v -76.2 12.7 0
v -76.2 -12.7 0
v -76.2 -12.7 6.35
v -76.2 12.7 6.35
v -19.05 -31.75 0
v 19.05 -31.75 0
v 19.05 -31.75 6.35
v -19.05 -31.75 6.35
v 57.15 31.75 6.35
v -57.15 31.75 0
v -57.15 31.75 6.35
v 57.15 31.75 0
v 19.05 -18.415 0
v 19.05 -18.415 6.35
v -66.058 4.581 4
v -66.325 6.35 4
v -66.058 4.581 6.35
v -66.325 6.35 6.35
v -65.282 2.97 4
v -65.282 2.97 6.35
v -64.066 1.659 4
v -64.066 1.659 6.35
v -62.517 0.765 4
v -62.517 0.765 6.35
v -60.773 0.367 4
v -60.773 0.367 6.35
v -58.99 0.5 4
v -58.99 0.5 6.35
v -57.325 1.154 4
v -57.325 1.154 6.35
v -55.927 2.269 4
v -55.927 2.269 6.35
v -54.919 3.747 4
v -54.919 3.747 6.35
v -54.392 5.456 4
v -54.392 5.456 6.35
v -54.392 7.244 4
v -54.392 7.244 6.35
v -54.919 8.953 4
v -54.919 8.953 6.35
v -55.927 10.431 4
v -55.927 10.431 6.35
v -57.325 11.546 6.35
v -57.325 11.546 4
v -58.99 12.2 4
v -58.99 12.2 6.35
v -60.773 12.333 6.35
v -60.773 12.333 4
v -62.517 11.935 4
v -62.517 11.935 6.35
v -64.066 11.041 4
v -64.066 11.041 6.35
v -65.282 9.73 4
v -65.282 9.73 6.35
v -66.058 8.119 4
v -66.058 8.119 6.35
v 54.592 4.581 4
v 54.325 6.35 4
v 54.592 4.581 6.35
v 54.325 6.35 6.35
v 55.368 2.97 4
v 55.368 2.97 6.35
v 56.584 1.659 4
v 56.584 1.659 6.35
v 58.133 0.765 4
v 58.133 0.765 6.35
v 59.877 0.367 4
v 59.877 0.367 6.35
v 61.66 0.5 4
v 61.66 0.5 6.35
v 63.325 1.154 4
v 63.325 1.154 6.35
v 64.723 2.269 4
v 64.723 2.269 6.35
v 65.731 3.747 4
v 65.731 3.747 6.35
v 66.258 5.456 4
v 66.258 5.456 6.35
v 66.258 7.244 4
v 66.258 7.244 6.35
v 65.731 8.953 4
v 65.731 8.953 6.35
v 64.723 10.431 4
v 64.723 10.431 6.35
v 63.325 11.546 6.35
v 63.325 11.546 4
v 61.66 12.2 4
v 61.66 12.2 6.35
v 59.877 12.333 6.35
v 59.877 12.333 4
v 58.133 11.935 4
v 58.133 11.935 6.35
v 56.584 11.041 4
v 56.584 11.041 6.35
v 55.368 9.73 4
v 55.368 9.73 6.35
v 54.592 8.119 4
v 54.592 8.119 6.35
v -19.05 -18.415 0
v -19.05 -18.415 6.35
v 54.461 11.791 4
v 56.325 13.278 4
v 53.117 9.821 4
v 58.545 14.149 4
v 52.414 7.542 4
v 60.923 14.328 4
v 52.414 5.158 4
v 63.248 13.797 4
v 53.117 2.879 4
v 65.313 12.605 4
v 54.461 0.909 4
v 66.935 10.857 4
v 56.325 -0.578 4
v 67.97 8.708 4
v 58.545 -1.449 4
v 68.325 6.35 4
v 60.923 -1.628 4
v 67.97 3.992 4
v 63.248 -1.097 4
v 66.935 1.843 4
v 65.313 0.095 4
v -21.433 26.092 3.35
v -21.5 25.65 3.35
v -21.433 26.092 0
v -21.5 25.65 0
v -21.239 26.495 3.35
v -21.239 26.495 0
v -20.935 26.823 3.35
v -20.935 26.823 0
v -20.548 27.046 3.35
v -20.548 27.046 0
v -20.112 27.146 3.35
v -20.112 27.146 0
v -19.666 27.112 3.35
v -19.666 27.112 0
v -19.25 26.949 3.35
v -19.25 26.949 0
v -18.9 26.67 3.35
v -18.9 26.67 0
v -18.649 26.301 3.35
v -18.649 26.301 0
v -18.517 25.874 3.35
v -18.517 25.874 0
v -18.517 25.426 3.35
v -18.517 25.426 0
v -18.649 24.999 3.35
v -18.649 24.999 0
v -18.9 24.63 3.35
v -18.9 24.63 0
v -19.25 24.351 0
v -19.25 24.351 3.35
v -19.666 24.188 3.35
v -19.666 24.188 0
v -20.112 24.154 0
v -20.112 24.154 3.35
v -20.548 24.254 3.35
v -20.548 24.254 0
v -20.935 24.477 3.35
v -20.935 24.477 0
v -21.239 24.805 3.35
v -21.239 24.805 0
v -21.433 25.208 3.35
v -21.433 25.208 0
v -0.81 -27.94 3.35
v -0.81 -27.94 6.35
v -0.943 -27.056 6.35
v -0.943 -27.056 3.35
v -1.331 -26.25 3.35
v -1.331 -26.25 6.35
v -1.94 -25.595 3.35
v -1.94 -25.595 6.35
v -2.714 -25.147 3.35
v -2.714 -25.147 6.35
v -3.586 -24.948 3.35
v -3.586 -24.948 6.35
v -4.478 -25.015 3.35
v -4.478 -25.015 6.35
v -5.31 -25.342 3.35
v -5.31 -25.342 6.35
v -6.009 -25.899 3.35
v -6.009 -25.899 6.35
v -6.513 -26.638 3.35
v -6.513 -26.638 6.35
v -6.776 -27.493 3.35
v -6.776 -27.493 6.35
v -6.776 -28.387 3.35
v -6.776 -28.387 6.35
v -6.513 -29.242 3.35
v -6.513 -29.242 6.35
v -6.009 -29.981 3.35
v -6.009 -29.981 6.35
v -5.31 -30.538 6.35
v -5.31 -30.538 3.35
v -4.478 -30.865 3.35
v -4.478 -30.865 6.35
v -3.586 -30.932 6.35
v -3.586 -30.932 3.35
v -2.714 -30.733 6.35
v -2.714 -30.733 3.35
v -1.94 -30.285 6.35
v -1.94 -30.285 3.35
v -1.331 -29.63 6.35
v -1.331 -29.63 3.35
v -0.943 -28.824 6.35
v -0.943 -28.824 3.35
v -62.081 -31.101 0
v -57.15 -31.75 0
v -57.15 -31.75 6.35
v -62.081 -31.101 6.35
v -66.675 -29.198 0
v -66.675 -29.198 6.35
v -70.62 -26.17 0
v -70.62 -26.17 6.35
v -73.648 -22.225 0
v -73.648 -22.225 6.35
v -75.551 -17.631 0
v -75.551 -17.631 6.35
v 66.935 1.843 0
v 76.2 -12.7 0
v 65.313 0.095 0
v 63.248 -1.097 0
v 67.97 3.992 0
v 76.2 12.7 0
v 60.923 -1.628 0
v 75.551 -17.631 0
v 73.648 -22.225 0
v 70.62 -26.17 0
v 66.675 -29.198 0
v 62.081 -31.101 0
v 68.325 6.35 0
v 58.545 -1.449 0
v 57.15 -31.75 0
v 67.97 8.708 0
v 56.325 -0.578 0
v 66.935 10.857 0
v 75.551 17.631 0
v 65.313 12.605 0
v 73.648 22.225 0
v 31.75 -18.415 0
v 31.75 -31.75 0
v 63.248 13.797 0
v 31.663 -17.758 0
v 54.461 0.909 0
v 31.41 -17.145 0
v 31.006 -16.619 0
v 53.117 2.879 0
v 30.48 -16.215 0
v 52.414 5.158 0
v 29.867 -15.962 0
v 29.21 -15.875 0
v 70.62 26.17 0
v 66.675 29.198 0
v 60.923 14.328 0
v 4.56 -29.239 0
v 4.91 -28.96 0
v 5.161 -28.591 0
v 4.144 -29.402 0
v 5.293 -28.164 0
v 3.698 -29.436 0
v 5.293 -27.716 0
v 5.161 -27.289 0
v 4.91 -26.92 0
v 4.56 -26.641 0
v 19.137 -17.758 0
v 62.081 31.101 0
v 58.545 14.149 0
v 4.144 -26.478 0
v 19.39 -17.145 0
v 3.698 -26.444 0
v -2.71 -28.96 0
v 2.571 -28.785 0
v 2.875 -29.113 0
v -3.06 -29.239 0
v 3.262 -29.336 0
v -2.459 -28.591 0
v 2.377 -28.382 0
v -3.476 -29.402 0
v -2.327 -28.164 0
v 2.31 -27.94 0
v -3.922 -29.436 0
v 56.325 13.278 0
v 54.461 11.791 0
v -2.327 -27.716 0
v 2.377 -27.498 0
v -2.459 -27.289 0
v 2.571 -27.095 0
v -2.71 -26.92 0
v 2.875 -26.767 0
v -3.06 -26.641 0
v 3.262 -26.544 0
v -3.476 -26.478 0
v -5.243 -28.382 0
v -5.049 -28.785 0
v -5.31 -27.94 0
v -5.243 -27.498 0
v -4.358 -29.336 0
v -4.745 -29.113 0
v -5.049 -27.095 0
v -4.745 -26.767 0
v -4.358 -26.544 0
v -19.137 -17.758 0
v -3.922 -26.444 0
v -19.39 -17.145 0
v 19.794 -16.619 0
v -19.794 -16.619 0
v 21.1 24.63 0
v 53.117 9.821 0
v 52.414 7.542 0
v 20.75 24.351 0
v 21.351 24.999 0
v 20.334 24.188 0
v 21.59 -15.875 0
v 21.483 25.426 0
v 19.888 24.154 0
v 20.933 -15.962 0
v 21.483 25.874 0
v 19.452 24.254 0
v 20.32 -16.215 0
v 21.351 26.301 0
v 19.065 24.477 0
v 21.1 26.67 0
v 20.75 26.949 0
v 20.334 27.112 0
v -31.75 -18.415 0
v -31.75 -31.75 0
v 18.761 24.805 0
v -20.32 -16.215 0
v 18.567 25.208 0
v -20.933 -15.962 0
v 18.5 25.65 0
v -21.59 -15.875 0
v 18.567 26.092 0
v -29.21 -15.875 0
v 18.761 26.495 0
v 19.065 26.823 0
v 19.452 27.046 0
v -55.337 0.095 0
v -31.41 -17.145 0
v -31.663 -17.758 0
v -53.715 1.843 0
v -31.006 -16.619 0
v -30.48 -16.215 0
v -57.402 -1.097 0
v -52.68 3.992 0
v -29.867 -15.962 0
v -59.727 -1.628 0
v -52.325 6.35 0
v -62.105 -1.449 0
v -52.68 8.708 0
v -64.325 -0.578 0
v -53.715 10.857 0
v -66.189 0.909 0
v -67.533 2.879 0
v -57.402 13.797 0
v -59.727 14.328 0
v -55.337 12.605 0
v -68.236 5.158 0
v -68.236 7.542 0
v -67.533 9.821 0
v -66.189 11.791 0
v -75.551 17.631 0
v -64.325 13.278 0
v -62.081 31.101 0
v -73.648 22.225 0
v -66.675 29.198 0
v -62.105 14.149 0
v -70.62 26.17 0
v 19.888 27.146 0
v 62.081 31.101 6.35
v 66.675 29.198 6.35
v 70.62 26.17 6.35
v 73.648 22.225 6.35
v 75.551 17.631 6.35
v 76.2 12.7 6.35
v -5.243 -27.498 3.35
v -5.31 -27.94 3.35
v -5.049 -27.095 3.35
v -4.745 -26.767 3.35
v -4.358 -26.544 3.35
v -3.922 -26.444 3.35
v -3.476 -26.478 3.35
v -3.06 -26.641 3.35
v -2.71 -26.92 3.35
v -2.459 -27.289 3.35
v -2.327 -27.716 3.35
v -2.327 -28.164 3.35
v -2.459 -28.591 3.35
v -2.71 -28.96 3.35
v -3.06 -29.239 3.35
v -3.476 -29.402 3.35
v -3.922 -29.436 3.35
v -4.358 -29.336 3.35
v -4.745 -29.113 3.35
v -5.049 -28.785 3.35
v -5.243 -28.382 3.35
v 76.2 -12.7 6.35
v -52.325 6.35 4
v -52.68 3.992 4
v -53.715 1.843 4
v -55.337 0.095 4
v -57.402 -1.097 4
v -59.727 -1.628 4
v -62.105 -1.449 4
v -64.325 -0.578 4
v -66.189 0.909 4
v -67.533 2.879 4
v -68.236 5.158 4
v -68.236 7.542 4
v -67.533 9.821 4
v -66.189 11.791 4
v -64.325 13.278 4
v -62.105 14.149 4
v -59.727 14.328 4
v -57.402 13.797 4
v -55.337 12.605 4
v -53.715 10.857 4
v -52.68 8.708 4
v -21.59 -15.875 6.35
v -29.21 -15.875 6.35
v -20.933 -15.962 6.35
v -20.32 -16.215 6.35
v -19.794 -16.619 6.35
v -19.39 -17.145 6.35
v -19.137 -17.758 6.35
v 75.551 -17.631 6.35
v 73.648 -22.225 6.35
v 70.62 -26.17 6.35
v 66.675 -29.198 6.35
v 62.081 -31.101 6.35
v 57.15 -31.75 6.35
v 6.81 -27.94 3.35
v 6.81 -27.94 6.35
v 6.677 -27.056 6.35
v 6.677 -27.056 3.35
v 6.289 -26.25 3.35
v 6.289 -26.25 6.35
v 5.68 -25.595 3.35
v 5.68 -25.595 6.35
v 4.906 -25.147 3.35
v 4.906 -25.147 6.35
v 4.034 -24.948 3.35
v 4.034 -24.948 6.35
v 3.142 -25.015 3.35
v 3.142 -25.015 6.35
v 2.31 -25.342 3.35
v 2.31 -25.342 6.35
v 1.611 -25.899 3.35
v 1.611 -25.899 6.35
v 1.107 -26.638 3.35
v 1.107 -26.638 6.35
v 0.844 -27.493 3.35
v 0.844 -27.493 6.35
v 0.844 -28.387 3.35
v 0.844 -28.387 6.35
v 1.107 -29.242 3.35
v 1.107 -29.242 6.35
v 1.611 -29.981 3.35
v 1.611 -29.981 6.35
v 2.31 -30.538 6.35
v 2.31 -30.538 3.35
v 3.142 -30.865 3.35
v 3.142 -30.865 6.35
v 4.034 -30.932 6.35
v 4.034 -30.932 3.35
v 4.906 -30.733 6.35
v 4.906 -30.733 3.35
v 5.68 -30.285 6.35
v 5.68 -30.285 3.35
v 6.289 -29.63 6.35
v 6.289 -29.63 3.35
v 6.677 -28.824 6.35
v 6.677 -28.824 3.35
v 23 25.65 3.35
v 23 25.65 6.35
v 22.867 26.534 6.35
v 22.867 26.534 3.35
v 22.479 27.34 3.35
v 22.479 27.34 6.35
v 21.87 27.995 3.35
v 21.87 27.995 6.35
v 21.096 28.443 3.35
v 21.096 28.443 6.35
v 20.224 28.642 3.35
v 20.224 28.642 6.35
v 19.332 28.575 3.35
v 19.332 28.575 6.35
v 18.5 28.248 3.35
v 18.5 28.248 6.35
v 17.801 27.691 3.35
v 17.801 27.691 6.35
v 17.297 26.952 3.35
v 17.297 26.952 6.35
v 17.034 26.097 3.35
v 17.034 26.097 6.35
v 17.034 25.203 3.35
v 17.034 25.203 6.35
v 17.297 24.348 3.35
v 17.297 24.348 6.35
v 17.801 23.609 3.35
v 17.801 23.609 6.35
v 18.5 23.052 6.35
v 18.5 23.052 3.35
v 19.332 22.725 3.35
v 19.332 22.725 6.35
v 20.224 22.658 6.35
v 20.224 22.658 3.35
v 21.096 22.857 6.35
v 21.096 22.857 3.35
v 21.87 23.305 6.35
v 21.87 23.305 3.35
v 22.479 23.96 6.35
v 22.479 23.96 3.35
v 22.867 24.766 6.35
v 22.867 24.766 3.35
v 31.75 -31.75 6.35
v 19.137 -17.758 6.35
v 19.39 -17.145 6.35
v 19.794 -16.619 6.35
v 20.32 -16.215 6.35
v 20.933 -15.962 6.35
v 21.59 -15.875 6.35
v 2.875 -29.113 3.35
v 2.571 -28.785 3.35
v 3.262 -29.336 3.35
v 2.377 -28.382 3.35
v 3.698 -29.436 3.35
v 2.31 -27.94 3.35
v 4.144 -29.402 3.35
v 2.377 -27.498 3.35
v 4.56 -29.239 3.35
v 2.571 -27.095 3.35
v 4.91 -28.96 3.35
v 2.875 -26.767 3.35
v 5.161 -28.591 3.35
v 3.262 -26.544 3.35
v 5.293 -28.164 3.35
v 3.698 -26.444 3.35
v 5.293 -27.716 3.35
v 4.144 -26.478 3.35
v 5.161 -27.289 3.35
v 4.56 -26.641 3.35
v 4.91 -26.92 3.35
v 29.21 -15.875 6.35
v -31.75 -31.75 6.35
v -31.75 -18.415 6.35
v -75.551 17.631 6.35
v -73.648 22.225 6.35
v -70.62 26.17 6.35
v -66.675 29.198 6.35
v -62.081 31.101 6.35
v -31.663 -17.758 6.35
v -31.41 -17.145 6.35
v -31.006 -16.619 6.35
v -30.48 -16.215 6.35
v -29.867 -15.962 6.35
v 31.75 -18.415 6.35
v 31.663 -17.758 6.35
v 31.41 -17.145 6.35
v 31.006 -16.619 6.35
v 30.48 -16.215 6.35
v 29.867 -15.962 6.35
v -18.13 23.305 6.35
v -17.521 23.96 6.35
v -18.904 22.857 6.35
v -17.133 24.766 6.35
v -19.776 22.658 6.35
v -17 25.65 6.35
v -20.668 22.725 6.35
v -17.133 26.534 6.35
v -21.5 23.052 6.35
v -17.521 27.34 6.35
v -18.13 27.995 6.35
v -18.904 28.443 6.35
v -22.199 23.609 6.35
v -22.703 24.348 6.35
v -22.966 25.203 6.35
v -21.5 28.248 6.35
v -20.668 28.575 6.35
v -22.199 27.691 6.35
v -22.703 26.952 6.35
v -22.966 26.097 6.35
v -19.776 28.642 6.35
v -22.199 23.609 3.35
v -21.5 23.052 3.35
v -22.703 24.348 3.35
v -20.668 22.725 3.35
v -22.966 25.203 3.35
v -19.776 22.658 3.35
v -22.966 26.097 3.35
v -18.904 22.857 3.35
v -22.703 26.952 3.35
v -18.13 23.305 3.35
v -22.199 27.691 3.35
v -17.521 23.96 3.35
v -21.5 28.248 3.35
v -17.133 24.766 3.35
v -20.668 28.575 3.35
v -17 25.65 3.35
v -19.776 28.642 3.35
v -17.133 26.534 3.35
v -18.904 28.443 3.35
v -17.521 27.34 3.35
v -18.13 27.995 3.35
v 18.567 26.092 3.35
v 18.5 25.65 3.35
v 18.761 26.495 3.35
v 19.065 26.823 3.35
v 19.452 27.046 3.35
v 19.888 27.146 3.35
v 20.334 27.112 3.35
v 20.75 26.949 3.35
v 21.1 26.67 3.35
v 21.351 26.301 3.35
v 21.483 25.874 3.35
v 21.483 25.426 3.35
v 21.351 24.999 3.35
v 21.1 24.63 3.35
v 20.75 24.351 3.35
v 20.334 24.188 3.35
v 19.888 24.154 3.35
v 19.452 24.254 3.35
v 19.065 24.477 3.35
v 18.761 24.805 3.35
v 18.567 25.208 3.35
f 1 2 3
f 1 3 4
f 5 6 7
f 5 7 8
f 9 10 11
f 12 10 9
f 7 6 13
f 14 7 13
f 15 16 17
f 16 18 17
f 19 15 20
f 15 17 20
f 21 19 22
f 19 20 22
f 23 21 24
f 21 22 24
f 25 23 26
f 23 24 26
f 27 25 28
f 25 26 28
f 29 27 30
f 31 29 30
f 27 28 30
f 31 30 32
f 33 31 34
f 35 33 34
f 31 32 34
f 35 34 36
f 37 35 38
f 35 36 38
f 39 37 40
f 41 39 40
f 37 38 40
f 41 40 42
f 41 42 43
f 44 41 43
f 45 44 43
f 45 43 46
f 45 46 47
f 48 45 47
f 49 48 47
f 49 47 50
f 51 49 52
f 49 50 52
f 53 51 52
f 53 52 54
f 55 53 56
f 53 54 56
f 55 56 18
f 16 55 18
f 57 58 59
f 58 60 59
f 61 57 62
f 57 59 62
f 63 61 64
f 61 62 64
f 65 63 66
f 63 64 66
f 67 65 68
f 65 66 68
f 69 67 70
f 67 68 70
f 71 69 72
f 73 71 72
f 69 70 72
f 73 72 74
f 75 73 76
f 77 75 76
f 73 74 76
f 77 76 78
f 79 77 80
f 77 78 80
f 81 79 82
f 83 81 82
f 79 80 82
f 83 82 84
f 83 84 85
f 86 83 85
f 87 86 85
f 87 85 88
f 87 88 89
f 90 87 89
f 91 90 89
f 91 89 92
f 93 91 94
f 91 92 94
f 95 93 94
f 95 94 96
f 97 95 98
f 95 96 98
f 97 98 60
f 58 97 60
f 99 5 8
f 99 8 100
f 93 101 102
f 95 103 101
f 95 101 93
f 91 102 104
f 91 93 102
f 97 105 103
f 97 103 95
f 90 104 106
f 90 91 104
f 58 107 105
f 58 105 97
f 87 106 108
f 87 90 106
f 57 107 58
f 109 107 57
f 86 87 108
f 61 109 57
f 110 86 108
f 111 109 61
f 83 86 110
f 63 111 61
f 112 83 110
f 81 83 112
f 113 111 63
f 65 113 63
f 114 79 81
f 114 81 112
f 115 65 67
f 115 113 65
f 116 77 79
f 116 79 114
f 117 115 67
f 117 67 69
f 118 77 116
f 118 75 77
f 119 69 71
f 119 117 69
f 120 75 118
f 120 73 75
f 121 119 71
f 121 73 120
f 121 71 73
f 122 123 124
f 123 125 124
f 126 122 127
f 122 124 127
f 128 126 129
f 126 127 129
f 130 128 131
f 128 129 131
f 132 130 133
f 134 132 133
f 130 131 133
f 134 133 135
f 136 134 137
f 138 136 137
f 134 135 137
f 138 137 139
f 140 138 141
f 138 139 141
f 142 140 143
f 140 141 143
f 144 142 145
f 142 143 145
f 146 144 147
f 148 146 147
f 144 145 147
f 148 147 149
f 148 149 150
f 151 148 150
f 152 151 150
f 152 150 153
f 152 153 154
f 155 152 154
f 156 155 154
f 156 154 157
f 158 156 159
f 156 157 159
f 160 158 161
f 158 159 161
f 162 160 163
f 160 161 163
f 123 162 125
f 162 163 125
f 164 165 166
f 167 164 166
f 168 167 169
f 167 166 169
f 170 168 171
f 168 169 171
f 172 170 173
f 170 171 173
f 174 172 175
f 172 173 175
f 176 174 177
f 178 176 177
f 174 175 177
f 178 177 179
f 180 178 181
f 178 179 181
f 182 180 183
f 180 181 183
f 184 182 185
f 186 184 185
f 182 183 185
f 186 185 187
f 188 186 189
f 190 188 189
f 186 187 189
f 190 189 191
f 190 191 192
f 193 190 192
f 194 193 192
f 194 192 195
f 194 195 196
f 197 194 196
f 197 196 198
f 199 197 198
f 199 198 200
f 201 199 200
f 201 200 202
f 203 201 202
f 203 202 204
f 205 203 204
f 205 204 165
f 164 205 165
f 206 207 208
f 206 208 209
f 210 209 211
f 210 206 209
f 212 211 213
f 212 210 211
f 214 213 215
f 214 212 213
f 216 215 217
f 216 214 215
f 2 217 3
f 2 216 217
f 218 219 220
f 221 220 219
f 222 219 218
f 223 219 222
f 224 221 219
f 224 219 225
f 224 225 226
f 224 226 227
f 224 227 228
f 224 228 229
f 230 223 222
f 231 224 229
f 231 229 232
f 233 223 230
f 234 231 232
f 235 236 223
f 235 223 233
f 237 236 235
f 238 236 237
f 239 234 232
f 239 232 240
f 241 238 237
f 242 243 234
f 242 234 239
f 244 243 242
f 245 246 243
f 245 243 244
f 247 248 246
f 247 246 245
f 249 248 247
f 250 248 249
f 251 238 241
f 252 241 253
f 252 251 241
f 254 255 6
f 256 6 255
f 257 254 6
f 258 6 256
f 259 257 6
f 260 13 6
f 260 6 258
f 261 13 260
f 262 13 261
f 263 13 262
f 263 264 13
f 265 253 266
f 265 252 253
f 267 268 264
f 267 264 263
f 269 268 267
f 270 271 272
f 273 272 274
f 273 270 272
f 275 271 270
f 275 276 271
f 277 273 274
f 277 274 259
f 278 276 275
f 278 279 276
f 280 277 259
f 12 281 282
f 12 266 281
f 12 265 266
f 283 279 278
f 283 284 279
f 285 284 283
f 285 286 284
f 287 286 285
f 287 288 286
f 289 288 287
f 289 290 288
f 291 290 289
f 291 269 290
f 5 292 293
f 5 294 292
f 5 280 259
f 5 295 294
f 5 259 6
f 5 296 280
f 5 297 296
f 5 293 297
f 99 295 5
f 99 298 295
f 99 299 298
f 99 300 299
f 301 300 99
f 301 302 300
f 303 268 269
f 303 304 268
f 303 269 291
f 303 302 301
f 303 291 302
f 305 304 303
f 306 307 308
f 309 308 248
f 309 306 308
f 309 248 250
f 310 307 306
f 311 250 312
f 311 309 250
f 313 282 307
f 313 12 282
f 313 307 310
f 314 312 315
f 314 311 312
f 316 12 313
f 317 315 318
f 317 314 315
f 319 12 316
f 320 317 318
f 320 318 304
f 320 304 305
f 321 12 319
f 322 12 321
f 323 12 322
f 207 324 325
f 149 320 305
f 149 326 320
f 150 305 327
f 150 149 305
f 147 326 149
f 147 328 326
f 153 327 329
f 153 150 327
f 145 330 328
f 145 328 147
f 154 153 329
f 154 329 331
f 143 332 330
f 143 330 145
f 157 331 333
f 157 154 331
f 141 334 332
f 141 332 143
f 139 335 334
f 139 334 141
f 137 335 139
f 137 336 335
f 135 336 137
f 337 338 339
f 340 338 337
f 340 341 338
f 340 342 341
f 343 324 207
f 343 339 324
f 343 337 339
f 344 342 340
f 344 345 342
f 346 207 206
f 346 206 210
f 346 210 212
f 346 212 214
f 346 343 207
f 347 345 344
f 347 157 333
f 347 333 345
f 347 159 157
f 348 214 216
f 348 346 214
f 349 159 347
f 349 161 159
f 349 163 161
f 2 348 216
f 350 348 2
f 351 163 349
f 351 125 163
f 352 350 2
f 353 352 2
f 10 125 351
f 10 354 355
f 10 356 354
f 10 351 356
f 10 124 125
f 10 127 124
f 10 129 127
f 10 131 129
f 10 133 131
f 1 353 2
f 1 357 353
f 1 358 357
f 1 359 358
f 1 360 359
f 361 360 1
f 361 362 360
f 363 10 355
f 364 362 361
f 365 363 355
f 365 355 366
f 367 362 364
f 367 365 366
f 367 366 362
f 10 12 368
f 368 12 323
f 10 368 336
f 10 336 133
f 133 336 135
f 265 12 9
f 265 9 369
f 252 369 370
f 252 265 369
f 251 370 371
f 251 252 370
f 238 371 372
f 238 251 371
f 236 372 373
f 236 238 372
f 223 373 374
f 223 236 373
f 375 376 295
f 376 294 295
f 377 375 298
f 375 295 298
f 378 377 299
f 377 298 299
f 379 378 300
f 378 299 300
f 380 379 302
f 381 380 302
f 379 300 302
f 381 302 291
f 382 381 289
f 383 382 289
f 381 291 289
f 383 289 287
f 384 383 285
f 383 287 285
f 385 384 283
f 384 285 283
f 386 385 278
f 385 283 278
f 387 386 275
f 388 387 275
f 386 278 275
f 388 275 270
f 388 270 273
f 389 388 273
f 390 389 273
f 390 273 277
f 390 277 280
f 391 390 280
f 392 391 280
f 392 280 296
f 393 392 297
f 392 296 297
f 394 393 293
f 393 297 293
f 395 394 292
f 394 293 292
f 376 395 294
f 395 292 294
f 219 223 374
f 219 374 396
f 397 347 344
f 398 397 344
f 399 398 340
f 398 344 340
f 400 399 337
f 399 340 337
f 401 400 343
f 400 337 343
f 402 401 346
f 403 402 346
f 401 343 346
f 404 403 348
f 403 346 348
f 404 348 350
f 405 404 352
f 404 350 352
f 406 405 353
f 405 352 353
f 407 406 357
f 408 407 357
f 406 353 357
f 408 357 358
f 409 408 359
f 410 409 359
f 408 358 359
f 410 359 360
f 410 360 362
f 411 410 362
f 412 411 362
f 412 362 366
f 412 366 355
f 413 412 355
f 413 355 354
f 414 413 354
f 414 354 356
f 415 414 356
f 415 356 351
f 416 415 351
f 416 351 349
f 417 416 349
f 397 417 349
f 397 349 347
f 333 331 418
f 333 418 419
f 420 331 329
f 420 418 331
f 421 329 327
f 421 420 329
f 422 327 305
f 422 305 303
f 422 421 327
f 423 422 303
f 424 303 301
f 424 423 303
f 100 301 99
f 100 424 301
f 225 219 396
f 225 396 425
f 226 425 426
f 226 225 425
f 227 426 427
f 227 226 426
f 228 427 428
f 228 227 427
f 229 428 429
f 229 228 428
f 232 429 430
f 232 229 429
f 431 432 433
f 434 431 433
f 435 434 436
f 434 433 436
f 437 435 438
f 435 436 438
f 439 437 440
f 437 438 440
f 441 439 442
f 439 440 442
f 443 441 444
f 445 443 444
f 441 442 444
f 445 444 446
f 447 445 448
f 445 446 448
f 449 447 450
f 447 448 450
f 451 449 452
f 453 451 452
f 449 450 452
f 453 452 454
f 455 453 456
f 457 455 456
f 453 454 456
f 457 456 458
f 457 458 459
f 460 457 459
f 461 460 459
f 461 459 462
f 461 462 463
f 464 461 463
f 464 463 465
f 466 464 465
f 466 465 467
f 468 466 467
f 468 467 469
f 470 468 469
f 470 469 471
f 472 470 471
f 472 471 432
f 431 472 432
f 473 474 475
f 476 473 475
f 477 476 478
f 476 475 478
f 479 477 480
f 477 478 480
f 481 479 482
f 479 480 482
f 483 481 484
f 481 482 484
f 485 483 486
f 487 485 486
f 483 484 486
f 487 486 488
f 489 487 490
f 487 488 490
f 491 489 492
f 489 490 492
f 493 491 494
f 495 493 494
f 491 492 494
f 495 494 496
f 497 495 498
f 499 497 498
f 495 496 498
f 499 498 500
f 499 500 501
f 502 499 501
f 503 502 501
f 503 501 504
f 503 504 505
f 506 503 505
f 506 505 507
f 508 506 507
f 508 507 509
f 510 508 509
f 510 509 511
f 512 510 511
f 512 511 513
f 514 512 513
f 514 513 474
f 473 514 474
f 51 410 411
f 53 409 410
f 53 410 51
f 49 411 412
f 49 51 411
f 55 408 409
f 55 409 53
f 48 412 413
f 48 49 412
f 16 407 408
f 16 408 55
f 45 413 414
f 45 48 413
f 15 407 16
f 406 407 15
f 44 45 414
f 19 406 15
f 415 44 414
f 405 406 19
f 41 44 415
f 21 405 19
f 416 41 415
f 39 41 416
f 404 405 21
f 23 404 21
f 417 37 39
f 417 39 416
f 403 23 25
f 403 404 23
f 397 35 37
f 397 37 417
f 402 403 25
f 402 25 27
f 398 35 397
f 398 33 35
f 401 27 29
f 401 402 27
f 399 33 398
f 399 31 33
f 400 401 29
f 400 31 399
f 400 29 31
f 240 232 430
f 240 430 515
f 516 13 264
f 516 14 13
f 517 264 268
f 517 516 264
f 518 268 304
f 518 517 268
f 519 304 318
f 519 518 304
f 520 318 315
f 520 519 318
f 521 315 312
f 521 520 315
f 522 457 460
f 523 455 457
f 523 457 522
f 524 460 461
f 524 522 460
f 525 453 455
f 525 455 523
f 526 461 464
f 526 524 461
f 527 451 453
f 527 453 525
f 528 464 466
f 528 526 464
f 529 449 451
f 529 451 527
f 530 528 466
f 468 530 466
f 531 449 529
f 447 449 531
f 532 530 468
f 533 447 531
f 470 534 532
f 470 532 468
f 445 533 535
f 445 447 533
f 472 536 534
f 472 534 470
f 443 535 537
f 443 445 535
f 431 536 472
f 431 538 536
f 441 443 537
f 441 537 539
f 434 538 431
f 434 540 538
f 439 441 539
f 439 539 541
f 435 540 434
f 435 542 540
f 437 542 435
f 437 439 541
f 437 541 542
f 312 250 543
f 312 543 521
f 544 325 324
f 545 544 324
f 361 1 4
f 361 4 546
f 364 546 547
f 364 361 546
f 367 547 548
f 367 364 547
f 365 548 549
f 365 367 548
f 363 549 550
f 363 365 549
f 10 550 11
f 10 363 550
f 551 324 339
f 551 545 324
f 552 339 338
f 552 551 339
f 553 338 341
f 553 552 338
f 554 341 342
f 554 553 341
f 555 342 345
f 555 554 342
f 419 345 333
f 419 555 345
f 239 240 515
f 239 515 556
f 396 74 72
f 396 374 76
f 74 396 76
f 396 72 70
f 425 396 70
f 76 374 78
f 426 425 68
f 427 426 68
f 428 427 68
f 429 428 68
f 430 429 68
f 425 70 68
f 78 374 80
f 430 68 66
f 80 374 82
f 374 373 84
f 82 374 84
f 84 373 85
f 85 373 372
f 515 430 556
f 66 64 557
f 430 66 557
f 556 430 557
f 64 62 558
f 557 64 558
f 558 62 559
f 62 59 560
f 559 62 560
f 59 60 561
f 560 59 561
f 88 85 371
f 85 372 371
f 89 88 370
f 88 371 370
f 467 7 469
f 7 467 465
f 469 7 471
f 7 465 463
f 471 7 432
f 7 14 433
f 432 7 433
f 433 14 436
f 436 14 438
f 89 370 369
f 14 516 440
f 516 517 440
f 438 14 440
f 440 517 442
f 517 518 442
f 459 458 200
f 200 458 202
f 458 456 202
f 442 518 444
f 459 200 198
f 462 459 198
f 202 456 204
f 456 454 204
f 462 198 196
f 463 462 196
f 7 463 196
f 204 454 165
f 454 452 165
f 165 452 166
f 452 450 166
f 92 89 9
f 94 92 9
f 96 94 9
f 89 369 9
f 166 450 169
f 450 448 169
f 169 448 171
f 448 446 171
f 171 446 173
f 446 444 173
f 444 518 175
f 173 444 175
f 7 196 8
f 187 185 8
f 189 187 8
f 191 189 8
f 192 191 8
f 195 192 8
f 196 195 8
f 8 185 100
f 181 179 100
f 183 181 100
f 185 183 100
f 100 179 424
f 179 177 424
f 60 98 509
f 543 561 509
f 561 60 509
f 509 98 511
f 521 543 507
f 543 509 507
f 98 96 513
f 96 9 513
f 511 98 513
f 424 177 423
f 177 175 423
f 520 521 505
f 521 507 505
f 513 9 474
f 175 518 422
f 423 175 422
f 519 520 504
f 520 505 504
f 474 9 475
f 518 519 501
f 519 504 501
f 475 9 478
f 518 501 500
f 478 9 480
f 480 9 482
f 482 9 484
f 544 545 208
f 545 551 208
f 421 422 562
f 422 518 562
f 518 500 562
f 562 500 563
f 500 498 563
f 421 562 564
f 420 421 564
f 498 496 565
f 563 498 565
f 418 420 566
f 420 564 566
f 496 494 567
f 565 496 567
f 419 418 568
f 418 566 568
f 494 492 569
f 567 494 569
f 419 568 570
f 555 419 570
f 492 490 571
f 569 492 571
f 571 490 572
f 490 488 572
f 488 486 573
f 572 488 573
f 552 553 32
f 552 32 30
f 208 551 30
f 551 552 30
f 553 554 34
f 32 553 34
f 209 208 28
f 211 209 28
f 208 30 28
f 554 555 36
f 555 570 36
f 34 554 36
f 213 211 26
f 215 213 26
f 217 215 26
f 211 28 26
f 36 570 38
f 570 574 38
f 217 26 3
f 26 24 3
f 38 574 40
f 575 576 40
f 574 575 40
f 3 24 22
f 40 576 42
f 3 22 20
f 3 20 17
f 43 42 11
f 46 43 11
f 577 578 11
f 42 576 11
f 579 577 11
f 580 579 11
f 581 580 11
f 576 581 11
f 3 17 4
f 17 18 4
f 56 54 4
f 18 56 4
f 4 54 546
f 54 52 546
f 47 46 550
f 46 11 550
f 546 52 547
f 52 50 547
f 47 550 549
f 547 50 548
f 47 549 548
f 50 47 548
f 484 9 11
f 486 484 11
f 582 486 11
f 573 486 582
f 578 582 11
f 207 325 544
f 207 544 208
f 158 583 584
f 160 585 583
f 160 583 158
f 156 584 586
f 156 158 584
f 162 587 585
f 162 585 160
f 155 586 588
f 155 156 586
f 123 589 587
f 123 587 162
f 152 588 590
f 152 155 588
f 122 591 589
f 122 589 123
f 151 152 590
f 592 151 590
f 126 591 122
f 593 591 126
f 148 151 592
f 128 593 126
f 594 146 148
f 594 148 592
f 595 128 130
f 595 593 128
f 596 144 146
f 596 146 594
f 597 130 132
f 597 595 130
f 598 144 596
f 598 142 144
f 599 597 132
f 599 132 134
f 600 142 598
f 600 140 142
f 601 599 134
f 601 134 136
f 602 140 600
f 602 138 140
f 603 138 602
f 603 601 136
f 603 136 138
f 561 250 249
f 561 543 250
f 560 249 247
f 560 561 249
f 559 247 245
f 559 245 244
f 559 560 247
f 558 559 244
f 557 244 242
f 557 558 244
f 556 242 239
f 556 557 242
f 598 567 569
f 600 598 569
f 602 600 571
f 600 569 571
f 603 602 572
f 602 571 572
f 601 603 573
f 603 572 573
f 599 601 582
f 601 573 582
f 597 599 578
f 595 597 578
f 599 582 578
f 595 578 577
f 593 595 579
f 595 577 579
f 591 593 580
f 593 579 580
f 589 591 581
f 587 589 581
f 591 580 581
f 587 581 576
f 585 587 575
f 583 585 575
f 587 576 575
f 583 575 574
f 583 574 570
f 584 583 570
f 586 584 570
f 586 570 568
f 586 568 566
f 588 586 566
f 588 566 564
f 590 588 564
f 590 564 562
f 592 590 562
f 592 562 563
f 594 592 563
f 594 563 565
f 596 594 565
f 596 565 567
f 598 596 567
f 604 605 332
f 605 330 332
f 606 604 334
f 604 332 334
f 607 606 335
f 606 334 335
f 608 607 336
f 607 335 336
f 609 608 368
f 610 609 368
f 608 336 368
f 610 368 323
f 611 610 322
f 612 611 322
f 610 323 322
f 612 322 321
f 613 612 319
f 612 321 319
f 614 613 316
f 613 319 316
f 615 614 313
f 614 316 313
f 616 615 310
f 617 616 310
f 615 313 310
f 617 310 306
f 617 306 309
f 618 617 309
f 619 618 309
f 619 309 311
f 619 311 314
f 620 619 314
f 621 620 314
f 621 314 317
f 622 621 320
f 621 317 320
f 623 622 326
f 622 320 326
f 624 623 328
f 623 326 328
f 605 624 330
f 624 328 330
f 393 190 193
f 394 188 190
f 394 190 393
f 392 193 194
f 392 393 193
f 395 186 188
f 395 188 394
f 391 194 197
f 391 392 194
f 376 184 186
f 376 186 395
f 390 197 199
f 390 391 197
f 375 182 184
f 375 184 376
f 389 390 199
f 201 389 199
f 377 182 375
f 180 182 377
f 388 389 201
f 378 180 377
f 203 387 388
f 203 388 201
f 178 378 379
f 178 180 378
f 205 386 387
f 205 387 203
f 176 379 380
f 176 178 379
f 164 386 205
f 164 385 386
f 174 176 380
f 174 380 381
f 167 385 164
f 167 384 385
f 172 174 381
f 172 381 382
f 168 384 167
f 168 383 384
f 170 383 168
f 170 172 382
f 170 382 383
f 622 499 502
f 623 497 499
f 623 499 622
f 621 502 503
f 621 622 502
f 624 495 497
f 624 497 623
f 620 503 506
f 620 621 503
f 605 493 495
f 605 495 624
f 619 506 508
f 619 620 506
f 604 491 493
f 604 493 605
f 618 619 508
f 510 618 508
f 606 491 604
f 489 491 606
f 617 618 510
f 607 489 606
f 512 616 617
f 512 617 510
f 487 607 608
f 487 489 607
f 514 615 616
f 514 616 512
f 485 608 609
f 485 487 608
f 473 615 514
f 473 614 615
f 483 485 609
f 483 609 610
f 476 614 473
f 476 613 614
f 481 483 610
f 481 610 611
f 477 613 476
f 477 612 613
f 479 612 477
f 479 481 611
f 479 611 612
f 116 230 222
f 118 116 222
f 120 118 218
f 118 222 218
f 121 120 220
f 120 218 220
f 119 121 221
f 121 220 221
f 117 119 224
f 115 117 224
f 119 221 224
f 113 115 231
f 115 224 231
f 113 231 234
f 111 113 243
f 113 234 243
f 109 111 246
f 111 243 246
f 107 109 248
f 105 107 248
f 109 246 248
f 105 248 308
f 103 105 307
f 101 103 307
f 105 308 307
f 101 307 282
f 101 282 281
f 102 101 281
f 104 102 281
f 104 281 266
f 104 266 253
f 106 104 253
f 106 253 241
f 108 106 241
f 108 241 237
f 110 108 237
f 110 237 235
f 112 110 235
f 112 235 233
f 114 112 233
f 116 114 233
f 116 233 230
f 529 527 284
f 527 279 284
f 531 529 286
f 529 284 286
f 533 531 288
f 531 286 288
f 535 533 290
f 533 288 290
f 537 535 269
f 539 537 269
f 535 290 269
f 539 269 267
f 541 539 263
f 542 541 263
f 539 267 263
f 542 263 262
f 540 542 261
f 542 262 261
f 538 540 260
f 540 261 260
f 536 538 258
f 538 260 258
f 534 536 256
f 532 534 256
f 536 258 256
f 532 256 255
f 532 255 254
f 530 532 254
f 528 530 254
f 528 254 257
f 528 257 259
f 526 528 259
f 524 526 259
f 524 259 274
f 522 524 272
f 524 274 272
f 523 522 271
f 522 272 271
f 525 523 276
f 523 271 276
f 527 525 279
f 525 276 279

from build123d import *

# Parameters (mm, degrees)
BOSS_EXTRUDE1_DEPTH                                 = 6.35
CBORE_FOR_00_BINDING_HEAD_MACHINE_SCREW_D           = 3.000000096
CBORE_FOR_00_BINDING_HEAD_MACHINE_SCREW_CBORE_D     = 5.999999938
CBORE_FOR_00_BINDING_HEAD_MACHINE_SCREW_CBORE_DEPTH = 3.000000096
SKETCH6_W                                           = 12.7
SKETCH6_H                                           = 15.875
CUT_EXTRUDE1_DEPTH                                  = 6.35
FILLET2_R                                           = 2.54
CBORE_FOR_00_BINDING_HEAD_MACHINE_S_2_D             = 11.999999876
CBORE_FOR_00_BINDING_HEAD_MACHINE_S_2_CBORE_D       = 16.000000004
CBORE_FOR_00_BINDING_HEAD_MACHINE_S_2_CBORE_DEPTH   = 3.999999874


with BuildPart() as part:
    # Sketch1 → Boss-Extrude1 (new body)
    with BuildSketch(Plane.XY):
        with BuildLine():
            Line((-57.15, 31.75), (57.15, 31.75))
            ThreePointArc((57.15, 31.75), (70.620384182, 26.170384182), (76.2, 12.7))
            Line((76.2, 12.7), (76.2, -12.7))
            ThreePointArc((76.2, -12.7), (70.620384182, -26.170384182), (57.15, -31.75))
            Line((57.15, -31.75), (-57.15, -31.75))
            ThreePointArc((-57.15, -31.75), (-70.620384182, -26.170384182), (-76.2, -12.7))
            Line((-76.2, -12.7), (-76.2, 12.7))
            ThreePointArc((-76.2, 12.7), (-70.620384182, 26.170384182), (-57.15, 31.75))
        make_face()
    extrude(amount=BOSS_EXTRUDE1_DEPTH)

    # CBORE for _00 Binding Head Machine Screw (through all)
    with Locations(Plane.XY.offset(6.35)):
        with Locations((-20, 25.65), (20, 25.65), (3.81, -27.94), (-3.81, -27.94)):
            CounterBoreHole(CBORE_FOR_00_BINDING_HEAD_MACHINE_SCREW_D / 2, CBORE_FOR_00_BINDING_HEAD_MACHINE_SCREW_CBORE_D / 2, CBORE_FOR_00_BINDING_HEAD_MACHINE_SCREW_CBORE_DEPTH)

    # Sketch6 → Cut-Extrude1 (cut)
    with BuildSketch(Plane(origin=(0, 0, 0), x_dir=(-1, 0, 0), z_dir=(0, 0, -1))):
        with Locations((-25.4, -23.8125)):
            Rectangle(SKETCH6_W, SKETCH6_H)
        with Locations((25.4, -23.8125)):
            Rectangle(SKETCH6_W, SKETCH6_H)
    extrude(amount=-CUT_EXTRUDE1_DEPTH, mode=Mode.SUBTRACT)

    # Fillet2
    fillet2_edges = [part.edges().sort_by_distance(p)[0] for p in [
        (19.05, -15.875, 3.175),
        (31.75, -15.875, 3.175),
        (-19.05, -15.875, 3.175),
        (-31.75, -15.875, 3.175),
    ]]
    fillet(fillet2_edges, radius=FILLET2_R)

    # CBORE for _00 Binding Head Machine S 2 (through all)
    with Locations(Plane(origin=(0, 0, 0), x_dir=(1, 0, 0), z_dir=(0, 0, -1))):
        with Locations((-60.325, -6.35), (60.325, -6.35)):
            CounterBoreHole(CBORE_FOR_00_BINDING_HEAD_MACHINE_S_2_D / 2, CBORE_FOR_00_BINDING_HEAD_MACHINE_S_2_CBORE_D / 2, CBORE_FOR_00_BINDING_HEAD_MACHINE_S_2_CBORE_DEPTH)


solid = part.part
